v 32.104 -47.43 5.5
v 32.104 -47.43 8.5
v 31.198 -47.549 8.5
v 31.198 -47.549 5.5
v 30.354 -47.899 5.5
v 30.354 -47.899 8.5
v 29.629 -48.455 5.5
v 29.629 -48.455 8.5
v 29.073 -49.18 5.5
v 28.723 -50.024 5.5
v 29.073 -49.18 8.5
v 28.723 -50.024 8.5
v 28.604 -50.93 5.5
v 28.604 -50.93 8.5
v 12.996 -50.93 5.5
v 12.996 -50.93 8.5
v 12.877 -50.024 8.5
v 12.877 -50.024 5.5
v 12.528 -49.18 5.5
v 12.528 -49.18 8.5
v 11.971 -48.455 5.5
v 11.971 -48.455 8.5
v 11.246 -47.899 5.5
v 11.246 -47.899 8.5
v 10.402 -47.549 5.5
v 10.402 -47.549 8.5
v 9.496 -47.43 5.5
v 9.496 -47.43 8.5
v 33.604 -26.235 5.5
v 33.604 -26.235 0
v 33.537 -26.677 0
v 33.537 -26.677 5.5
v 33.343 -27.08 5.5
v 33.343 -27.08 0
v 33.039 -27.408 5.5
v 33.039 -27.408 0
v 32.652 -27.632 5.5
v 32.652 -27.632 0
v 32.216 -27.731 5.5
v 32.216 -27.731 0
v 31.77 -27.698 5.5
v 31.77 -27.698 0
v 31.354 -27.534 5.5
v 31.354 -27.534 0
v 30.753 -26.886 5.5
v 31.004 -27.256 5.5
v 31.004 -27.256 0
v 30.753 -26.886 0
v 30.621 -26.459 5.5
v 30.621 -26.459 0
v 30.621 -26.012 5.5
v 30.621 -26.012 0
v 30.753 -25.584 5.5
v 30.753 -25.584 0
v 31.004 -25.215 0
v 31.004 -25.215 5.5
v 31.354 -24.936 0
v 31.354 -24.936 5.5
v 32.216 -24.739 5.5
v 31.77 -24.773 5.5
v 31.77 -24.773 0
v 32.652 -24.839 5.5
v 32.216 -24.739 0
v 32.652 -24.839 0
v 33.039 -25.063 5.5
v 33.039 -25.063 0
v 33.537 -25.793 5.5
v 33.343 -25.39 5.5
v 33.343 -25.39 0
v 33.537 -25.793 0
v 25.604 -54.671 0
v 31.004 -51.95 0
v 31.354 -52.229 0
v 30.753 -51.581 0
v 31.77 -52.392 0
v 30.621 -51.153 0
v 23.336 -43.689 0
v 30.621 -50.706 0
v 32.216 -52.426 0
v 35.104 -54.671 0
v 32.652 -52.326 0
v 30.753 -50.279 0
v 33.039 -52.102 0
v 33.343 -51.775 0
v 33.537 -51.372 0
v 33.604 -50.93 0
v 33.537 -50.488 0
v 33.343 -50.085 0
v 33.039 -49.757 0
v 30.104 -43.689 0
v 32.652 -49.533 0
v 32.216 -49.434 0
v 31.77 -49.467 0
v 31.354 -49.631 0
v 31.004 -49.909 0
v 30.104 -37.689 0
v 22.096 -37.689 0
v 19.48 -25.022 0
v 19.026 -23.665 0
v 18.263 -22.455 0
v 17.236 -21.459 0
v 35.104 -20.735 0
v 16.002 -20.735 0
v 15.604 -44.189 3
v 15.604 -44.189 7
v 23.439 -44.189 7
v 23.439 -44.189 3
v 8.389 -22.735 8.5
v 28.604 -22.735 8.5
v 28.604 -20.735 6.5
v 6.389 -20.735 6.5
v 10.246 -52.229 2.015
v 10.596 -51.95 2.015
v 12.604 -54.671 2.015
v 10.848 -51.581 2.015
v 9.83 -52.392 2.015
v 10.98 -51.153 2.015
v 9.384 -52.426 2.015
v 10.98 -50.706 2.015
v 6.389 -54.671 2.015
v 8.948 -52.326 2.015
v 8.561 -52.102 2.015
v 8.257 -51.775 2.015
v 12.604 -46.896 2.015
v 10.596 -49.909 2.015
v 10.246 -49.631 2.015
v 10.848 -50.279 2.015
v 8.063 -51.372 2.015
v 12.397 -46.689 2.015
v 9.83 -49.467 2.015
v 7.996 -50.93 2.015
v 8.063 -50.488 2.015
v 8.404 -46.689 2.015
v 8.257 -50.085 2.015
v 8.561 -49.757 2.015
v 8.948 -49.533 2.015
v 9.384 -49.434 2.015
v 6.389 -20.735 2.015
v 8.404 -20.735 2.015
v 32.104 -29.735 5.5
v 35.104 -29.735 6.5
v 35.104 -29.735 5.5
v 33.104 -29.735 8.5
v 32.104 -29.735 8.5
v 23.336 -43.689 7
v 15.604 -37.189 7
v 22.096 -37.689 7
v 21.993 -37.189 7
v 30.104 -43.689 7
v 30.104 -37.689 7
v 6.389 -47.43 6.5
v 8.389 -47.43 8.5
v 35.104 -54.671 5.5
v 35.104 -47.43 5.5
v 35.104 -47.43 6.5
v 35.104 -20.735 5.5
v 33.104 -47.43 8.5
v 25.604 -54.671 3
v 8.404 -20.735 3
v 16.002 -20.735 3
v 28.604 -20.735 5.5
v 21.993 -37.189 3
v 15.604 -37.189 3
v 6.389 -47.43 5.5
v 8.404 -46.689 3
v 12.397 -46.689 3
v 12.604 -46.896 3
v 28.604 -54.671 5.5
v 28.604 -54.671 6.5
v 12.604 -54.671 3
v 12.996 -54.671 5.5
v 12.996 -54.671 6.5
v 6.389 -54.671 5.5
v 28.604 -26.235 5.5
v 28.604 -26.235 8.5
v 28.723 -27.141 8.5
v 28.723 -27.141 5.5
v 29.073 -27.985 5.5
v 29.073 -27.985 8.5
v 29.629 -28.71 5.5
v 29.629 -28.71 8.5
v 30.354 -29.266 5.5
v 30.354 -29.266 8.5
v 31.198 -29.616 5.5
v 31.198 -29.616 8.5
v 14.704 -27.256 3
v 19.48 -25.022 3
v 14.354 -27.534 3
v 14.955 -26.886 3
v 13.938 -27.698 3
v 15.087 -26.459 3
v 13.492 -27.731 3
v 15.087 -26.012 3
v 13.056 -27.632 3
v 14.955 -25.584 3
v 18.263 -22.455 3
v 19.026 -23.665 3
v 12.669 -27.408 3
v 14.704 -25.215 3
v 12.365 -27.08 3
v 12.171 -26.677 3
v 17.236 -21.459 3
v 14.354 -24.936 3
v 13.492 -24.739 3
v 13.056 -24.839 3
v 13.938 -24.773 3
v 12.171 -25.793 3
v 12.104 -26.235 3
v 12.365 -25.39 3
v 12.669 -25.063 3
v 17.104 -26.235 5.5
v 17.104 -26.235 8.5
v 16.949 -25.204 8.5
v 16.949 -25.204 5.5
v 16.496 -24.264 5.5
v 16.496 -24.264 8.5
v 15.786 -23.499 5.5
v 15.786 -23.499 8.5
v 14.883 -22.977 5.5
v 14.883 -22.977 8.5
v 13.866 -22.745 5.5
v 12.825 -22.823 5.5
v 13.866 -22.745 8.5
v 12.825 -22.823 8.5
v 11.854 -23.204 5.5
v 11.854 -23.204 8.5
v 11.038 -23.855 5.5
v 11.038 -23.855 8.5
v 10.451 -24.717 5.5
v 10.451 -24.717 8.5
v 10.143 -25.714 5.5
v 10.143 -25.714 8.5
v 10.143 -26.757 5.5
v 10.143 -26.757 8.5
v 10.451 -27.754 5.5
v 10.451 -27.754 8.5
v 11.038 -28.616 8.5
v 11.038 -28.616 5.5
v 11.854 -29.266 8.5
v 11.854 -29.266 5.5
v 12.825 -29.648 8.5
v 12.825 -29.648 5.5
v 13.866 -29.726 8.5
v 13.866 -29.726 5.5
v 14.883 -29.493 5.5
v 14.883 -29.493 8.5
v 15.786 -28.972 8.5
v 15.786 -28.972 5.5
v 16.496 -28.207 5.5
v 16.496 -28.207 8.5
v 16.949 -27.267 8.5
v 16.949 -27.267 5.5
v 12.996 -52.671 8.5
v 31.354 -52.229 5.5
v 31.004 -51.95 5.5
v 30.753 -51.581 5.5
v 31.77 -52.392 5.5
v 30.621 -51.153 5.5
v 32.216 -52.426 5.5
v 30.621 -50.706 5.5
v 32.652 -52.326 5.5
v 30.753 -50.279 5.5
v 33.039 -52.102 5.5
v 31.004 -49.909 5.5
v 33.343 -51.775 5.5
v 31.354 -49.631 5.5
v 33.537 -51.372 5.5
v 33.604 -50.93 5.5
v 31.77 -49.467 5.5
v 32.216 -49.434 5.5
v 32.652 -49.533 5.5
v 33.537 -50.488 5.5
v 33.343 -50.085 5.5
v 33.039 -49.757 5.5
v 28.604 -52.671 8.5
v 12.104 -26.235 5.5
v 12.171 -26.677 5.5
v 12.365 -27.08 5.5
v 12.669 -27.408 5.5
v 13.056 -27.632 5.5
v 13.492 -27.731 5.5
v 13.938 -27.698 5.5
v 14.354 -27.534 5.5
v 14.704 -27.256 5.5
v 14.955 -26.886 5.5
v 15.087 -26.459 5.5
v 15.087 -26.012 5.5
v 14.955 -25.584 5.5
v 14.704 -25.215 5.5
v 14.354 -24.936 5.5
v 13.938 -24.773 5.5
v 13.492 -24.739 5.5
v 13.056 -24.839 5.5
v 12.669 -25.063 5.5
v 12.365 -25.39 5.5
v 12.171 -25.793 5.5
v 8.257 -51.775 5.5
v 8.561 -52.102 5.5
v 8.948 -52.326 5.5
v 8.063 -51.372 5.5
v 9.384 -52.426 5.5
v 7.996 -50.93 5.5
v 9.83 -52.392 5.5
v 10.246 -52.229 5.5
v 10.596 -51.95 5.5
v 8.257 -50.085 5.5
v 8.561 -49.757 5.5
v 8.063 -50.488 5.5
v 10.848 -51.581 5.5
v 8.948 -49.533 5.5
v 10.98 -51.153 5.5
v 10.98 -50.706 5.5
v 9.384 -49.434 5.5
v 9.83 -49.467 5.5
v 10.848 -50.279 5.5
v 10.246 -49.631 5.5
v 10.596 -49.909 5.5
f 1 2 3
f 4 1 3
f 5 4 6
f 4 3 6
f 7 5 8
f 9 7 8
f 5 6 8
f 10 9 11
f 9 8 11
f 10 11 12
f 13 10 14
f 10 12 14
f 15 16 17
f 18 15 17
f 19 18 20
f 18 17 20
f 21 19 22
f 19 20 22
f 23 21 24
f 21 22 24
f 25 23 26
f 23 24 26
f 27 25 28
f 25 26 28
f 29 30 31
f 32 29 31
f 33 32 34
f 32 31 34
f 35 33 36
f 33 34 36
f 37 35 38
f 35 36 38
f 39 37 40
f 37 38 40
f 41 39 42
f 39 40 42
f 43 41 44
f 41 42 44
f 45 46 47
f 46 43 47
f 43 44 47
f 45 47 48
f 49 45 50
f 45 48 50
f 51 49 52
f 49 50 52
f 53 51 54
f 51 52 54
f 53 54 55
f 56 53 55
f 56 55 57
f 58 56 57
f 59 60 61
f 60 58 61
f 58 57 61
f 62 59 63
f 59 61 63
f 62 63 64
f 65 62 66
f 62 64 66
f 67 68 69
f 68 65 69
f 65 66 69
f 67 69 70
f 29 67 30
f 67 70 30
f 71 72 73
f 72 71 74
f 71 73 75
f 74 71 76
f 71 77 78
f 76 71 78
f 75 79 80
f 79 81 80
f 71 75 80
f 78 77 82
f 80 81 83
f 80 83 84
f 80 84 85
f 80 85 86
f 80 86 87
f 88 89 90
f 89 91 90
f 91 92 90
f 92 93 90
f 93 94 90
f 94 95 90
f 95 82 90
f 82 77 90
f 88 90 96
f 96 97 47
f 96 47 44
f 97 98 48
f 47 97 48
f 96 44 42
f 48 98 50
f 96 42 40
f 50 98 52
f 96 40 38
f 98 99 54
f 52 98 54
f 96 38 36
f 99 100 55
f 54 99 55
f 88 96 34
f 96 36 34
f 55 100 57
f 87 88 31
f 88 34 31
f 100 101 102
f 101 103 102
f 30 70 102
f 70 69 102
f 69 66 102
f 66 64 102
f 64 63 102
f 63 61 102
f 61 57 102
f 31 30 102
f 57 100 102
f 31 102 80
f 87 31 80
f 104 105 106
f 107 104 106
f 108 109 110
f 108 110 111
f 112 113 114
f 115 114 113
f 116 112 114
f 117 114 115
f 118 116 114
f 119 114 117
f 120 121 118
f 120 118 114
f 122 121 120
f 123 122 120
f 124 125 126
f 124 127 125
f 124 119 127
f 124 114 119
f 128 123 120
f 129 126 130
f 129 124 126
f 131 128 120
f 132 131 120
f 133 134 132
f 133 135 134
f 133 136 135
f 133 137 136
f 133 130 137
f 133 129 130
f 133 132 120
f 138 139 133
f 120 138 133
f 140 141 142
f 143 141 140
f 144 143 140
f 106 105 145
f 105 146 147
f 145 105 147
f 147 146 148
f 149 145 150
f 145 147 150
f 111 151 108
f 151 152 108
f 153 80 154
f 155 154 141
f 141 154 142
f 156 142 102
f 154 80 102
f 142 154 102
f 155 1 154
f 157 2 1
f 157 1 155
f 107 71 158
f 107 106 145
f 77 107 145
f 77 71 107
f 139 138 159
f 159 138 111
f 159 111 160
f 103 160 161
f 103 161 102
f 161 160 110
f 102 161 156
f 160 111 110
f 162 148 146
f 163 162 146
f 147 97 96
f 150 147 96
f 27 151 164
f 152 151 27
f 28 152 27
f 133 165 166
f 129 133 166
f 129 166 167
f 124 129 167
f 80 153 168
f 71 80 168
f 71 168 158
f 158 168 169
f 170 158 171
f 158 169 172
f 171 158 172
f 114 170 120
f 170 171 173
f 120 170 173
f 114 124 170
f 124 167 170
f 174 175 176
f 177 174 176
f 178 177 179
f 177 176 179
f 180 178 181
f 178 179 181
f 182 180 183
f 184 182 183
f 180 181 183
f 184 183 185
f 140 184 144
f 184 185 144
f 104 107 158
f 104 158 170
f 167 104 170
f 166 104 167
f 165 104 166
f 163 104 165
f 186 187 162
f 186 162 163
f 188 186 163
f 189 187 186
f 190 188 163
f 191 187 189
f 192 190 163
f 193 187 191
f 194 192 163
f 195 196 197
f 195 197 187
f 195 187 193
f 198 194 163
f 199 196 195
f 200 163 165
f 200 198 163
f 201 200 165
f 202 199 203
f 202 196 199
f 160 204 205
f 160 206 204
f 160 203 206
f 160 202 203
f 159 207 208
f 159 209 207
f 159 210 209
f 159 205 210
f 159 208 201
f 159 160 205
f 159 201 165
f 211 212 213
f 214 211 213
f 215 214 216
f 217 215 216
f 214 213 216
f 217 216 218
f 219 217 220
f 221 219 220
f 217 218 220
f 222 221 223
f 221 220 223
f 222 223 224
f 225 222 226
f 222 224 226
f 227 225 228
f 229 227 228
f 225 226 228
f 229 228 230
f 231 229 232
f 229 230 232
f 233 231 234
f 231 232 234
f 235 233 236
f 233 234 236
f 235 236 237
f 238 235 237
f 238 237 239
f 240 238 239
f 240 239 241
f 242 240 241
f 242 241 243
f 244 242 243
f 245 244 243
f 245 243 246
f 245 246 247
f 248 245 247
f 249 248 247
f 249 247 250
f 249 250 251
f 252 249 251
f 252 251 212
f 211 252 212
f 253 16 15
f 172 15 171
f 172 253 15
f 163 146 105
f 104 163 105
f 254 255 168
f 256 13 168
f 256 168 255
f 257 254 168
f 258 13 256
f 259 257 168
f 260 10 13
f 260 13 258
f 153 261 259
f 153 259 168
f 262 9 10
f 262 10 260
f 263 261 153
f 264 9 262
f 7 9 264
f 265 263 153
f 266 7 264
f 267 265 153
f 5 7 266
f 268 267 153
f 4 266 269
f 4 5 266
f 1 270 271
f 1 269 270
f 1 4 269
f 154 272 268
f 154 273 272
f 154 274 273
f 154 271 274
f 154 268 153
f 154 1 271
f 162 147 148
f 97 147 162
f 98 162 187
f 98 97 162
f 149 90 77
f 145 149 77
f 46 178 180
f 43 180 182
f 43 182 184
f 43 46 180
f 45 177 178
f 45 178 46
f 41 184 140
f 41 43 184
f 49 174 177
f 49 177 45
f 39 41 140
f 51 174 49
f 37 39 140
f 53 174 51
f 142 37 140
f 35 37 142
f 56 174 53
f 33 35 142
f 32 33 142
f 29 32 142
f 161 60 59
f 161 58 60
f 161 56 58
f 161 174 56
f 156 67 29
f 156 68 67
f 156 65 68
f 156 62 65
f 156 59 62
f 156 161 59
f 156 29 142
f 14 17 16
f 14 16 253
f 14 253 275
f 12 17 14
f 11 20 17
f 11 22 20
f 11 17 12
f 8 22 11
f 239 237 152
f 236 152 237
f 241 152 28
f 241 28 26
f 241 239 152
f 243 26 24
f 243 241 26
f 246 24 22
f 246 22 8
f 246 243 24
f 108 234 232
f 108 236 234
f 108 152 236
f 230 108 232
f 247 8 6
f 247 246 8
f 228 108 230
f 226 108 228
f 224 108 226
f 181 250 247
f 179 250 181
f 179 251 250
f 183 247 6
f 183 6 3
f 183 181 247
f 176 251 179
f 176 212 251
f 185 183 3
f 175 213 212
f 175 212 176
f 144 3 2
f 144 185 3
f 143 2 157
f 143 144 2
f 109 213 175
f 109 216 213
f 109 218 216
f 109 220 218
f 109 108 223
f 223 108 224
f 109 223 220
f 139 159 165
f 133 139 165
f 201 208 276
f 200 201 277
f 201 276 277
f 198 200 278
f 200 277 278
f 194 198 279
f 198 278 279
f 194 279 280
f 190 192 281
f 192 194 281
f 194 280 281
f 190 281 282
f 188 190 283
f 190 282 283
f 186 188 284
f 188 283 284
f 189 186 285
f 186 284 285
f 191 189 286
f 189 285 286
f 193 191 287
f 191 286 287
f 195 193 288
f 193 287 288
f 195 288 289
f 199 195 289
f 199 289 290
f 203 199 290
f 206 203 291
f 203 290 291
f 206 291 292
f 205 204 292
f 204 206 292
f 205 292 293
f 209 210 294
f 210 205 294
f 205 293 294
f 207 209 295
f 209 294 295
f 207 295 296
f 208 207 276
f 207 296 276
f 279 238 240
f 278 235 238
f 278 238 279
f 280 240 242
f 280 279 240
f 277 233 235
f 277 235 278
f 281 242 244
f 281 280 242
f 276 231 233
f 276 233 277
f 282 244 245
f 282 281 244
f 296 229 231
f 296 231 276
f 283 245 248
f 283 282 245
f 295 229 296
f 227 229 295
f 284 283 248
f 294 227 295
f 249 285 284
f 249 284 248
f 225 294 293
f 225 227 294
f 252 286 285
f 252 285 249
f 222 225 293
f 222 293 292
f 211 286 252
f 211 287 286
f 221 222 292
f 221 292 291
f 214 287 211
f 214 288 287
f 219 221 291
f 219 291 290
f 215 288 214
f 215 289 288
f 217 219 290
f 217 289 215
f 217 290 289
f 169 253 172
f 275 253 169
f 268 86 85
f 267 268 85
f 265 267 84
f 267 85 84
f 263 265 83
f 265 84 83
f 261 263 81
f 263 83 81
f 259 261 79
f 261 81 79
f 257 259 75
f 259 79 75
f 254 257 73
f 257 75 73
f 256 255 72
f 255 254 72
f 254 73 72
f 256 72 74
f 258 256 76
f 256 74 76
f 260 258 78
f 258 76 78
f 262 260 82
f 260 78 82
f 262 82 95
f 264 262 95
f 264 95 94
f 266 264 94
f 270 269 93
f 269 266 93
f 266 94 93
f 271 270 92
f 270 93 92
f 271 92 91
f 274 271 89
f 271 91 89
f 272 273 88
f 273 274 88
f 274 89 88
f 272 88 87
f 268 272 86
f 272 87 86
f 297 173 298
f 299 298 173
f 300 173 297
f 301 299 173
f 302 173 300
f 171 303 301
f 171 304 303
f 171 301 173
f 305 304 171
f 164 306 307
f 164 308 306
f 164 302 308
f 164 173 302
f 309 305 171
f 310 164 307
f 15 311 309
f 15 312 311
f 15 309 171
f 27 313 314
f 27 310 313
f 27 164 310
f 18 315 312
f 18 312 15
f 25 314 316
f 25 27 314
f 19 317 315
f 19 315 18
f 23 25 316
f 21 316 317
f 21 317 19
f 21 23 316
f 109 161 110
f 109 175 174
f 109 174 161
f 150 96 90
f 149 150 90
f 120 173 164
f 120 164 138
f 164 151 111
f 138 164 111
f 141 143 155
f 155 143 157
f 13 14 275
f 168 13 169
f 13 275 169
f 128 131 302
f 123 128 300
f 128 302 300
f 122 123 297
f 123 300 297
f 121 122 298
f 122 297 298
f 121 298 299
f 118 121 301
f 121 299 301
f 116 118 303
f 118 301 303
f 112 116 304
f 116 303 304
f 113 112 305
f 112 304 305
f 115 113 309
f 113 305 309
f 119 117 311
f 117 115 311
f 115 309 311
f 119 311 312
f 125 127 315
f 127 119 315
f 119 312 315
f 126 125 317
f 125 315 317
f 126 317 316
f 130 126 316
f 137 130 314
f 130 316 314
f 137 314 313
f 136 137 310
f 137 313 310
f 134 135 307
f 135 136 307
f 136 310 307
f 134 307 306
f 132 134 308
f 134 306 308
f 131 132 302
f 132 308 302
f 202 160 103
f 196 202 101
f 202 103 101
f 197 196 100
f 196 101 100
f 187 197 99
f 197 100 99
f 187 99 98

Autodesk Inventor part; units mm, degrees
ref_plane "YZ Plane" through (0, 0, 0) normal (1, 0, 0) x (0, 1, 0)
ref_plane "XZ Plane" through (0, 0, 0) normal (0, 1, 0) x (-1, 0, 0)
sketch "Sketch1" plane through (0, 0, 0) normal (0, 0, 1) x (1, 0, 0)
  circle A0 centre (13.604, -26.2353) radius 1.6 projected
  line L0 (18.604, -44.1888) -> (15.604, -44.1888) projected
  line L1 (15.604, -44.1888) -> (15.604, -37.1888) projected
  line L2 (15.604, -37.1888) -> (18.604, -37.1888) projected
  line L3 (18.604, -26.2353) -> (18.604, -37.1888) projected
  arc A1 (18.604, -26.2353) -> (8.604, -26.2353) centre (13.604, -26.2353) ccw projected
  line L4 (8.604, -26.2353) -> (8.604, -45.6888) projected
  line L5 (9.104, -46.1888) -> (8.604, -45.6888) projected
  line L6 (9.104, -46.1888) -> (12.604, -46.1888) projected
  line L7 (13.104, -46.6888) -> (12.604, -46.1888) projected
  line L8 (13.104, -46.6888) -> (13.104, -55.1706) projected
  line L9 (12.604, -55.6706) -> (13.104, -55.1706) projected
  line L10 (12.604, -55.6706) -> (3.2048, -55.6706) projected
  line L11 (3.2048, -55.6706) -> (3.2048, -62.5334) projected
  line L12 (3.2048, -62.5334) -> (8.604, -62.5334) projected
  line L13 (8.604, -62.5334) -> (8.604, -81.1802) projected
  line L14 (8.604, -81.1802) -> (9.604, -81.1802) projected
  line L15 (9.604, -62.5334) -> (9.604, -81.1802) projected
  line L16 (9.604, -62.5334) -> (17.604, -62.5334) projected
  line L17 (17.604, -81.1802) -> (17.604, -62.5334) projected
  line L18 (17.604, -81.1802) -> (18.604, -81.1802) projected
  line L19 (18.604, -44.1888) -> (18.604, -81.1802) projected
  line L20 (19.104, -37.6888) -> (16.104, -37.6888)
  line L21 (16.104, -37.6888) -> (16.104, -43.6888)
  line L22 (16.104, -43.6888) -> (19.104, -43.6888)
  line L23 (19.104, -43.6888) -> (19.104, -81.6802)
  line L24 (19.104, -81.6802) -> (17.104, -81.6802)
  line L25 (17.104, -81.6802) -> (17.104, -63.0334)
  line L26 (17.104, -63.0334) -> (10.104, -63.0334)
  line L27 (10.104, -63.0334) -> (10.104, -81.6802)
  line L28 (10.104, -81.6802) -> (8.104, -81.6802)
  line L29 (8.104, -81.6802) -> (8.104, -63.0334)
  line L30 (8.104, -63.0334) -> (2.7048, -63.0334)
  line L31 (2.7048, -63.0334) -> (2.7048, -55.1706)
  line L32 (2.7048, -55.1706) -> (12.3969, -55.1706)
  line L33 (12.3969, -55.1706) -> (12.604, -54.9635)
  line L34 (12.604, -54.9635) -> (12.604, -46.8959)
  line L35 (12.604, -46.8959) -> (12.3969, -46.6888)
  line L36 (12.3969, -46.6888) -> (8.8969, -46.6888)
  line L37 (8.8969, -46.6888) -> (8.104, -45.8959)
  line L38 (8.104, -45.8959) -> (8.104, -26.2353)
  arc A2 (19.104, -26.2353) -> (8.104, -26.2353) centre (13.604, -26.2353) ccw
  line L39 (19.104, -26.2353) -> (19.104, -37.6888)
  line L40 (30.104, -37.6888) -> (30.104, -43.6888)
  line L41 (19.604, -38.1888) -> (16.604, -38.1888)
  line L42 (16.604, -38.1888) -> (16.604, -43.1888)
  line L43 (16.604, -43.1888) -> (19.604, -43.1888)
  line L44 (19.604, -43.1888) -> (19.604, -82.1802)
  line L45 (19.604, -82.1802) -> (16.604, -82.1802)
  line L46 (16.604, -82.1802) -> (16.604, -63.5334)
  line L47 (16.604, -63.5334) -> (10.604, -63.5334)
  line L48 (10.604, -63.5334) -> (10.604, -82.1802)
  line L49 (10.604, -82.1802) -> (7.604, -82.1802)
  line L50 (7.604, -82.1802) -> (7.604, -63.5334)
  line L51 (7.604, -63.5334) -> (2.2048, -63.5334)
  line L52 (2.2048, -63.5334) -> (2.2048, -54.6706)
  line L53 (2.2048, -54.6706) -> (12.104, -54.6706)
  line L54 (12.104, -54.6706) -> (12.104, -47.1888)
  line L55 (12.104, -47.1888) -> (8.6898, -47.1888)
  line L56 (8.6898, -47.1888) -> (7.604, -46.103)
  line L57 (7.604, -46.103) -> (7.604, -26.2353)
  arc A3 (19.604, -26.2353) -> (7.604, -26.2353) centre (13.604, -26.2353) ccw
  line L58 (19.604, -26.2353) -> (19.604, -38.1888)
  circle A4 centre (9.4965, -50.9297) radius 1.5 projected
  line L59 (30.104, -37.6888) -> (35.104, -37.6888)
  line L60 (13.604, -20.7353) -> (35.104, -20.7353)
  line L61 (13.604, -20.7353) -> (35.104, -20.7353) construction
  line L62 (12.104, -54.6706) -> (35.104, -54.6706)
  line L63 (35.104, -54.6706) -> (35.104, -20.7353)
  line L64 (6.389, 0.2) -> (6.389, -55.4706) projected
  line L65 (19.604, -54.6706) -> (25.604, -54.6706)
  line L66 (35.104, -20.7353) -> (32.104, -20.7353)
  line L67 (32.104, -24.7353) -> (32.104, -52.4297)
  line L68 (9.4965, -50.9297) -> (32.104, -50.9297)
  circle A5 centre (32.104, -26.2353) radius 1.5
  circle A6 centre (32.104, -50.9297) radius 1.5
  line L69 (25.604, -54.6706) -> (23.3357, -43.6888)
  line L70 (16.104, -37.6888) -> (19.604, -37.6888)
  line L71 (22.0964, -37.6888) -> (30.104, -37.6888)
  line L72 (30.104, -43.6888) -> (23.3357, -43.6888)
  line L73 (19.604, -43.6888) -> (19.104, -43.6888)
  line L74 (22.0964, -37.6888) -> (19.4799, -25.0216)
  line L75 (18.5946, -20.7353) -> (18.0297, -18.0002)
  line L76 (13.604, -26.2353) -> (19.7306, -26.2353)
  line L77 (30.604, -26.2353) -> (32.104, -26.2353)
  point P0 (0, 0)
  point P1 (16.0019, -20.7353)
  dimension "d10" = 3
  dimension "d0" = 0.5
  dimension "d2" = 14
  dimension "d3" = 0.5
  dimension "d4" = 5
  dimension "d5" = 0
  dimension "d6" = 3.1842
  dimension "d7" = 6
  dimension "d8" = 3
  dimension "d9" = 3
extrude "Extrusion1" add sketch "Sketch1" along normal blind 7 contours L69 L72 L40 L59 L67 A6 L68 | L68 A6 L67 L59 L63 L62 L69 | L60 L63 L59 L71 L74 A3
sketch "Sketch2" plane through (0, 0, 7) normal (0, 0, 1) x (1, 0, 0)
  line L0 (25.604, -54.6706) -> (35.104, -54.6706) projected
  line L1 (35.104, -54.6706) -> (35.104, -20.7353) projected
  line L2 (35.104, -20.7353) -> (16.0019, -20.7353) projected
  arc A0 (19.4799, -25.0216) -> (16.0019, -20.7353) centre (13.604, -26.2353) ccw projected
  line L3 (19.4799, -25.0216) -> (22.0964, -37.6888) projected
  line L4 (22.0964, -37.6888) -> (30.104, -37.6888) projected
  line L5 (30.104, -37.6888) -> (30.104, -43.6888) projected
  line L6 (30.104, -43.6888) -> (23.3357, -43.6888) projected
  line L7 (23.3357, -43.6888) -> (25.604, -54.6706) projected
  circle A1 centre (32.104, -50.9297) radius 1.5 projected
  circle A2 centre (32.104, -26.2353) radius 1.5 projected
  circle A3 centre (13.604, -26.2353) radius 1.5 projected
  circle A4 centre (9.4965, -50.9297) radius 1.5 projected
  line L8 (6.389, 0.2) -> (6.389, -55.4706) projected
  line L9 (35.104, -20.7353) -> (6.389, -20.7353)
  line L10 (25.604, -54.6706) -> (35.104, -54.6706) projected
  line L11 (35.104, -54.6706) -> (6.389, -54.6706)
  point P0 (0, 0)
extrude "Extrusion2" add sketch "Sketch2" along normal blind 1.5
sketch "Sketch3" plane through (0, 0, 7) normal (0, 0, -1) x (-1, 0, 0)
  line L0 (-15.604, -37.1888) -> (-15.604, -44.1888) projected
  line L1 (-18.604, -37.1888) -> (-15.604, -37.1888) projected
  line L2 (-15.604, -44.1888) -> (-18.604, -44.1888) projected
  line L3 (-19.4799, -25.0216) -> (-22.0964, -37.6888) projected
  arc A0 (-16.0019, -20.7353) -> (-19.4799, -25.0216) centre (-13.604, -26.2353) ccw projected
  line L4 (-16.0019, -20.7353) -> (-6.389, -20.7353) projected
  line L5 (-6.389, -78.3802) -> (-6.389, 0.2) projected
  line L6 (-6.389, -54.6706) -> (-25.604, -54.6706) projected
  line L7 (-23.3357, -43.6888) -> (-25.604, -54.6706) projected
  line L8 (-15.604, -37.1888) -> (-21.9931, -37.1888)
  line L9 (-15.604, -44.1888) -> (-23.4389, -44.1888)
  circle A1 centre (-13.604, -26.2353) radius 1.5 projected
  circle A2 centre (-9.4965, -50.9297) radius 1.5 projected
  point P0 (0, 0)
extrude "Extrusion3" add sketch "Sketch3" along normal blind 4
sketch "Sketch4" plane through (0, 0, 8.5) normal (0, 0, 1) x (1, 0, 0)
  circle A0 centre (32.104, -26.2353) radius 1.5 projected
  circle A1 centre (13.604, -26.2353) radius 1.5 projected
  circle A2 centre (9.4965, -50.9297) radius 1.5 projected
  circle A3 centre (32.104, -50.9297) radius 1.5 projected
  circle A4 centre (32.104, -26.2353) radius 3.5
  circle A5 centre (13.604, -26.2353) radius 3.5
  circle A6 centre (32.104, -50.9297) radius 3.5
  circle A7 centre (9.4965, -50.9297) radius 3.5
  line L0 (35.104, -54.6706) -> (35.104, -20.7353) projected
  line L1 (6.389, -54.6706) -> (35.104, -54.6706) projected
  line L2 (6.5058, -78.3802) -> (6.5058, 0.2)
  line L3 (9.4965, -47.4297) -> (6.5058, -47.4297)
  line L4 (12.9965, -50.9297) -> (12.9965, -54.6706)
  line L5 (28.604, -50.9297) -> (28.604, -54.6706)
  line L6 (32.104, -47.4297) -> (35.104, -47.4297)
  line L7 (35.104, -29.7353) -> (32.104, -29.7353)
  line L8 (28.604, -26.2353) -> (28.604, -20.7353)
  line L9 (35.104, -20.7353) -> (16.0019, -20.7353) projected
  point P0 (0, 0)
  point P1 (6.5058, -54.6706)
  dimension "d17" = 7
  dimension "d18" = 7
  dimension "d19" = 7
  dimension "d20" = 7
extrude "Extrusion4" cut sketch "Sketch4" against normal blind 3 contours A4 L0 | L8 L9 L0 A4 | A4 L0 L7 | A5 | A6 L0 | L6 L0 A6 | A6 L0 L1 L5 | A7 L2 | L4 L1 L2 A7 | A7 L2 L3 picked at (34.604, -26.2353) picked at (34.604, -50.9297) picked at (7.0027, -50.9297)
sketch "Sketch5" plane through (0, 0, 8.5) normal (0, 0, 1) x (1, 0, 0)
  line L0 (6.5058, -54.6706) -> (6.5058, -47.4297) projected
  line L1 (6.389, -54.6706) -> (6.5058, -54.6706) projected
  line L2 (6.389, -20.7353) -> (6.389, -54.6706) projected
  line L3 (6.5058, -54.6706) -> (6.1522, -54.6706)
  line L4 (6.1522, -54.6706) -> (6.1522, -47.4297)
  line L5 (6.1522, -47.4297) -> (6.5058, -47.4297)
  line L6 (6.5058, -47.4297) -> (6.5058, -54.6706)
  point P0 (0, 0)
extrude "Extrusion5" cut sketch "Sketch5" against normal up to surface (3 mm away)
chamfer "Chamfer1" distance 2 angle 45 4 edges at (6.389, -34.0825, 8.5) (35.104, -38.5825, 8.5) (17.4965, -20.7353, 8.5) (20.8002, -54.6706, 8.5)
sketch "Sketch6" plane through (0, 0, 3) normal (0, 0, -1) x (-1, 0, 0)
  line L0 (-6.389, -54.6706) -> (-6.389, -20.7353) projected
  line L1 (-6.389, -55.1706) -> (-12.3969, -55.1706) projected
  line L2 (-12.604, -54.9635) -> (-12.3969, -55.1706) projected
  line L3 (-12.604, -46.8959) -> (-12.604, -54.9635) projected
  line L4 (-12.3969, -46.6888) -> (-12.604, -46.8959) projected
  line L5 (-8.404, -46.6888) -> (-12.3969, -46.6888) projected
  line L6 (-8.404, -20.7353) -> (-8.404, -46.6888) projected
  line L7 (-8.404, 3) -> (-8.404, -20.7353) projected
  line L8 (3.1786, 3) -> (-8.404, 3) projected
  line L9 (3.1786, 0.2) -> (3.1786, 3) projected
  line L10 (3.1786, 0.2) -> (-6.389, 0.2) projected
  line L11 (-6.389, 0.2) -> (-6.389, -55.1706) projected
  circle A0 centre (-9.4965, -50.9297) radius 1.5 projected
  line L12 (-6.389, -20.7353) -> (-16.0019, -20.7353) projected
  line L13 (-25.604, -54.6706) -> (-6.389, -54.6706) projected
  point P0 (0, 0)
  point P1 (-12.604, -54.6706)
ref_plane "Work Plane1" through (-23.745, -60.7506, 2.0147) normal (0, 0, 1) x (1, 0, 0)
extrude "Extrusion6" add sketch "Sketch6" along normal up to surface (0.9853 mm away) contours L13 L3 L4 L5 L6 L12 L0
properties part number "LatchCover_3DPrint"
